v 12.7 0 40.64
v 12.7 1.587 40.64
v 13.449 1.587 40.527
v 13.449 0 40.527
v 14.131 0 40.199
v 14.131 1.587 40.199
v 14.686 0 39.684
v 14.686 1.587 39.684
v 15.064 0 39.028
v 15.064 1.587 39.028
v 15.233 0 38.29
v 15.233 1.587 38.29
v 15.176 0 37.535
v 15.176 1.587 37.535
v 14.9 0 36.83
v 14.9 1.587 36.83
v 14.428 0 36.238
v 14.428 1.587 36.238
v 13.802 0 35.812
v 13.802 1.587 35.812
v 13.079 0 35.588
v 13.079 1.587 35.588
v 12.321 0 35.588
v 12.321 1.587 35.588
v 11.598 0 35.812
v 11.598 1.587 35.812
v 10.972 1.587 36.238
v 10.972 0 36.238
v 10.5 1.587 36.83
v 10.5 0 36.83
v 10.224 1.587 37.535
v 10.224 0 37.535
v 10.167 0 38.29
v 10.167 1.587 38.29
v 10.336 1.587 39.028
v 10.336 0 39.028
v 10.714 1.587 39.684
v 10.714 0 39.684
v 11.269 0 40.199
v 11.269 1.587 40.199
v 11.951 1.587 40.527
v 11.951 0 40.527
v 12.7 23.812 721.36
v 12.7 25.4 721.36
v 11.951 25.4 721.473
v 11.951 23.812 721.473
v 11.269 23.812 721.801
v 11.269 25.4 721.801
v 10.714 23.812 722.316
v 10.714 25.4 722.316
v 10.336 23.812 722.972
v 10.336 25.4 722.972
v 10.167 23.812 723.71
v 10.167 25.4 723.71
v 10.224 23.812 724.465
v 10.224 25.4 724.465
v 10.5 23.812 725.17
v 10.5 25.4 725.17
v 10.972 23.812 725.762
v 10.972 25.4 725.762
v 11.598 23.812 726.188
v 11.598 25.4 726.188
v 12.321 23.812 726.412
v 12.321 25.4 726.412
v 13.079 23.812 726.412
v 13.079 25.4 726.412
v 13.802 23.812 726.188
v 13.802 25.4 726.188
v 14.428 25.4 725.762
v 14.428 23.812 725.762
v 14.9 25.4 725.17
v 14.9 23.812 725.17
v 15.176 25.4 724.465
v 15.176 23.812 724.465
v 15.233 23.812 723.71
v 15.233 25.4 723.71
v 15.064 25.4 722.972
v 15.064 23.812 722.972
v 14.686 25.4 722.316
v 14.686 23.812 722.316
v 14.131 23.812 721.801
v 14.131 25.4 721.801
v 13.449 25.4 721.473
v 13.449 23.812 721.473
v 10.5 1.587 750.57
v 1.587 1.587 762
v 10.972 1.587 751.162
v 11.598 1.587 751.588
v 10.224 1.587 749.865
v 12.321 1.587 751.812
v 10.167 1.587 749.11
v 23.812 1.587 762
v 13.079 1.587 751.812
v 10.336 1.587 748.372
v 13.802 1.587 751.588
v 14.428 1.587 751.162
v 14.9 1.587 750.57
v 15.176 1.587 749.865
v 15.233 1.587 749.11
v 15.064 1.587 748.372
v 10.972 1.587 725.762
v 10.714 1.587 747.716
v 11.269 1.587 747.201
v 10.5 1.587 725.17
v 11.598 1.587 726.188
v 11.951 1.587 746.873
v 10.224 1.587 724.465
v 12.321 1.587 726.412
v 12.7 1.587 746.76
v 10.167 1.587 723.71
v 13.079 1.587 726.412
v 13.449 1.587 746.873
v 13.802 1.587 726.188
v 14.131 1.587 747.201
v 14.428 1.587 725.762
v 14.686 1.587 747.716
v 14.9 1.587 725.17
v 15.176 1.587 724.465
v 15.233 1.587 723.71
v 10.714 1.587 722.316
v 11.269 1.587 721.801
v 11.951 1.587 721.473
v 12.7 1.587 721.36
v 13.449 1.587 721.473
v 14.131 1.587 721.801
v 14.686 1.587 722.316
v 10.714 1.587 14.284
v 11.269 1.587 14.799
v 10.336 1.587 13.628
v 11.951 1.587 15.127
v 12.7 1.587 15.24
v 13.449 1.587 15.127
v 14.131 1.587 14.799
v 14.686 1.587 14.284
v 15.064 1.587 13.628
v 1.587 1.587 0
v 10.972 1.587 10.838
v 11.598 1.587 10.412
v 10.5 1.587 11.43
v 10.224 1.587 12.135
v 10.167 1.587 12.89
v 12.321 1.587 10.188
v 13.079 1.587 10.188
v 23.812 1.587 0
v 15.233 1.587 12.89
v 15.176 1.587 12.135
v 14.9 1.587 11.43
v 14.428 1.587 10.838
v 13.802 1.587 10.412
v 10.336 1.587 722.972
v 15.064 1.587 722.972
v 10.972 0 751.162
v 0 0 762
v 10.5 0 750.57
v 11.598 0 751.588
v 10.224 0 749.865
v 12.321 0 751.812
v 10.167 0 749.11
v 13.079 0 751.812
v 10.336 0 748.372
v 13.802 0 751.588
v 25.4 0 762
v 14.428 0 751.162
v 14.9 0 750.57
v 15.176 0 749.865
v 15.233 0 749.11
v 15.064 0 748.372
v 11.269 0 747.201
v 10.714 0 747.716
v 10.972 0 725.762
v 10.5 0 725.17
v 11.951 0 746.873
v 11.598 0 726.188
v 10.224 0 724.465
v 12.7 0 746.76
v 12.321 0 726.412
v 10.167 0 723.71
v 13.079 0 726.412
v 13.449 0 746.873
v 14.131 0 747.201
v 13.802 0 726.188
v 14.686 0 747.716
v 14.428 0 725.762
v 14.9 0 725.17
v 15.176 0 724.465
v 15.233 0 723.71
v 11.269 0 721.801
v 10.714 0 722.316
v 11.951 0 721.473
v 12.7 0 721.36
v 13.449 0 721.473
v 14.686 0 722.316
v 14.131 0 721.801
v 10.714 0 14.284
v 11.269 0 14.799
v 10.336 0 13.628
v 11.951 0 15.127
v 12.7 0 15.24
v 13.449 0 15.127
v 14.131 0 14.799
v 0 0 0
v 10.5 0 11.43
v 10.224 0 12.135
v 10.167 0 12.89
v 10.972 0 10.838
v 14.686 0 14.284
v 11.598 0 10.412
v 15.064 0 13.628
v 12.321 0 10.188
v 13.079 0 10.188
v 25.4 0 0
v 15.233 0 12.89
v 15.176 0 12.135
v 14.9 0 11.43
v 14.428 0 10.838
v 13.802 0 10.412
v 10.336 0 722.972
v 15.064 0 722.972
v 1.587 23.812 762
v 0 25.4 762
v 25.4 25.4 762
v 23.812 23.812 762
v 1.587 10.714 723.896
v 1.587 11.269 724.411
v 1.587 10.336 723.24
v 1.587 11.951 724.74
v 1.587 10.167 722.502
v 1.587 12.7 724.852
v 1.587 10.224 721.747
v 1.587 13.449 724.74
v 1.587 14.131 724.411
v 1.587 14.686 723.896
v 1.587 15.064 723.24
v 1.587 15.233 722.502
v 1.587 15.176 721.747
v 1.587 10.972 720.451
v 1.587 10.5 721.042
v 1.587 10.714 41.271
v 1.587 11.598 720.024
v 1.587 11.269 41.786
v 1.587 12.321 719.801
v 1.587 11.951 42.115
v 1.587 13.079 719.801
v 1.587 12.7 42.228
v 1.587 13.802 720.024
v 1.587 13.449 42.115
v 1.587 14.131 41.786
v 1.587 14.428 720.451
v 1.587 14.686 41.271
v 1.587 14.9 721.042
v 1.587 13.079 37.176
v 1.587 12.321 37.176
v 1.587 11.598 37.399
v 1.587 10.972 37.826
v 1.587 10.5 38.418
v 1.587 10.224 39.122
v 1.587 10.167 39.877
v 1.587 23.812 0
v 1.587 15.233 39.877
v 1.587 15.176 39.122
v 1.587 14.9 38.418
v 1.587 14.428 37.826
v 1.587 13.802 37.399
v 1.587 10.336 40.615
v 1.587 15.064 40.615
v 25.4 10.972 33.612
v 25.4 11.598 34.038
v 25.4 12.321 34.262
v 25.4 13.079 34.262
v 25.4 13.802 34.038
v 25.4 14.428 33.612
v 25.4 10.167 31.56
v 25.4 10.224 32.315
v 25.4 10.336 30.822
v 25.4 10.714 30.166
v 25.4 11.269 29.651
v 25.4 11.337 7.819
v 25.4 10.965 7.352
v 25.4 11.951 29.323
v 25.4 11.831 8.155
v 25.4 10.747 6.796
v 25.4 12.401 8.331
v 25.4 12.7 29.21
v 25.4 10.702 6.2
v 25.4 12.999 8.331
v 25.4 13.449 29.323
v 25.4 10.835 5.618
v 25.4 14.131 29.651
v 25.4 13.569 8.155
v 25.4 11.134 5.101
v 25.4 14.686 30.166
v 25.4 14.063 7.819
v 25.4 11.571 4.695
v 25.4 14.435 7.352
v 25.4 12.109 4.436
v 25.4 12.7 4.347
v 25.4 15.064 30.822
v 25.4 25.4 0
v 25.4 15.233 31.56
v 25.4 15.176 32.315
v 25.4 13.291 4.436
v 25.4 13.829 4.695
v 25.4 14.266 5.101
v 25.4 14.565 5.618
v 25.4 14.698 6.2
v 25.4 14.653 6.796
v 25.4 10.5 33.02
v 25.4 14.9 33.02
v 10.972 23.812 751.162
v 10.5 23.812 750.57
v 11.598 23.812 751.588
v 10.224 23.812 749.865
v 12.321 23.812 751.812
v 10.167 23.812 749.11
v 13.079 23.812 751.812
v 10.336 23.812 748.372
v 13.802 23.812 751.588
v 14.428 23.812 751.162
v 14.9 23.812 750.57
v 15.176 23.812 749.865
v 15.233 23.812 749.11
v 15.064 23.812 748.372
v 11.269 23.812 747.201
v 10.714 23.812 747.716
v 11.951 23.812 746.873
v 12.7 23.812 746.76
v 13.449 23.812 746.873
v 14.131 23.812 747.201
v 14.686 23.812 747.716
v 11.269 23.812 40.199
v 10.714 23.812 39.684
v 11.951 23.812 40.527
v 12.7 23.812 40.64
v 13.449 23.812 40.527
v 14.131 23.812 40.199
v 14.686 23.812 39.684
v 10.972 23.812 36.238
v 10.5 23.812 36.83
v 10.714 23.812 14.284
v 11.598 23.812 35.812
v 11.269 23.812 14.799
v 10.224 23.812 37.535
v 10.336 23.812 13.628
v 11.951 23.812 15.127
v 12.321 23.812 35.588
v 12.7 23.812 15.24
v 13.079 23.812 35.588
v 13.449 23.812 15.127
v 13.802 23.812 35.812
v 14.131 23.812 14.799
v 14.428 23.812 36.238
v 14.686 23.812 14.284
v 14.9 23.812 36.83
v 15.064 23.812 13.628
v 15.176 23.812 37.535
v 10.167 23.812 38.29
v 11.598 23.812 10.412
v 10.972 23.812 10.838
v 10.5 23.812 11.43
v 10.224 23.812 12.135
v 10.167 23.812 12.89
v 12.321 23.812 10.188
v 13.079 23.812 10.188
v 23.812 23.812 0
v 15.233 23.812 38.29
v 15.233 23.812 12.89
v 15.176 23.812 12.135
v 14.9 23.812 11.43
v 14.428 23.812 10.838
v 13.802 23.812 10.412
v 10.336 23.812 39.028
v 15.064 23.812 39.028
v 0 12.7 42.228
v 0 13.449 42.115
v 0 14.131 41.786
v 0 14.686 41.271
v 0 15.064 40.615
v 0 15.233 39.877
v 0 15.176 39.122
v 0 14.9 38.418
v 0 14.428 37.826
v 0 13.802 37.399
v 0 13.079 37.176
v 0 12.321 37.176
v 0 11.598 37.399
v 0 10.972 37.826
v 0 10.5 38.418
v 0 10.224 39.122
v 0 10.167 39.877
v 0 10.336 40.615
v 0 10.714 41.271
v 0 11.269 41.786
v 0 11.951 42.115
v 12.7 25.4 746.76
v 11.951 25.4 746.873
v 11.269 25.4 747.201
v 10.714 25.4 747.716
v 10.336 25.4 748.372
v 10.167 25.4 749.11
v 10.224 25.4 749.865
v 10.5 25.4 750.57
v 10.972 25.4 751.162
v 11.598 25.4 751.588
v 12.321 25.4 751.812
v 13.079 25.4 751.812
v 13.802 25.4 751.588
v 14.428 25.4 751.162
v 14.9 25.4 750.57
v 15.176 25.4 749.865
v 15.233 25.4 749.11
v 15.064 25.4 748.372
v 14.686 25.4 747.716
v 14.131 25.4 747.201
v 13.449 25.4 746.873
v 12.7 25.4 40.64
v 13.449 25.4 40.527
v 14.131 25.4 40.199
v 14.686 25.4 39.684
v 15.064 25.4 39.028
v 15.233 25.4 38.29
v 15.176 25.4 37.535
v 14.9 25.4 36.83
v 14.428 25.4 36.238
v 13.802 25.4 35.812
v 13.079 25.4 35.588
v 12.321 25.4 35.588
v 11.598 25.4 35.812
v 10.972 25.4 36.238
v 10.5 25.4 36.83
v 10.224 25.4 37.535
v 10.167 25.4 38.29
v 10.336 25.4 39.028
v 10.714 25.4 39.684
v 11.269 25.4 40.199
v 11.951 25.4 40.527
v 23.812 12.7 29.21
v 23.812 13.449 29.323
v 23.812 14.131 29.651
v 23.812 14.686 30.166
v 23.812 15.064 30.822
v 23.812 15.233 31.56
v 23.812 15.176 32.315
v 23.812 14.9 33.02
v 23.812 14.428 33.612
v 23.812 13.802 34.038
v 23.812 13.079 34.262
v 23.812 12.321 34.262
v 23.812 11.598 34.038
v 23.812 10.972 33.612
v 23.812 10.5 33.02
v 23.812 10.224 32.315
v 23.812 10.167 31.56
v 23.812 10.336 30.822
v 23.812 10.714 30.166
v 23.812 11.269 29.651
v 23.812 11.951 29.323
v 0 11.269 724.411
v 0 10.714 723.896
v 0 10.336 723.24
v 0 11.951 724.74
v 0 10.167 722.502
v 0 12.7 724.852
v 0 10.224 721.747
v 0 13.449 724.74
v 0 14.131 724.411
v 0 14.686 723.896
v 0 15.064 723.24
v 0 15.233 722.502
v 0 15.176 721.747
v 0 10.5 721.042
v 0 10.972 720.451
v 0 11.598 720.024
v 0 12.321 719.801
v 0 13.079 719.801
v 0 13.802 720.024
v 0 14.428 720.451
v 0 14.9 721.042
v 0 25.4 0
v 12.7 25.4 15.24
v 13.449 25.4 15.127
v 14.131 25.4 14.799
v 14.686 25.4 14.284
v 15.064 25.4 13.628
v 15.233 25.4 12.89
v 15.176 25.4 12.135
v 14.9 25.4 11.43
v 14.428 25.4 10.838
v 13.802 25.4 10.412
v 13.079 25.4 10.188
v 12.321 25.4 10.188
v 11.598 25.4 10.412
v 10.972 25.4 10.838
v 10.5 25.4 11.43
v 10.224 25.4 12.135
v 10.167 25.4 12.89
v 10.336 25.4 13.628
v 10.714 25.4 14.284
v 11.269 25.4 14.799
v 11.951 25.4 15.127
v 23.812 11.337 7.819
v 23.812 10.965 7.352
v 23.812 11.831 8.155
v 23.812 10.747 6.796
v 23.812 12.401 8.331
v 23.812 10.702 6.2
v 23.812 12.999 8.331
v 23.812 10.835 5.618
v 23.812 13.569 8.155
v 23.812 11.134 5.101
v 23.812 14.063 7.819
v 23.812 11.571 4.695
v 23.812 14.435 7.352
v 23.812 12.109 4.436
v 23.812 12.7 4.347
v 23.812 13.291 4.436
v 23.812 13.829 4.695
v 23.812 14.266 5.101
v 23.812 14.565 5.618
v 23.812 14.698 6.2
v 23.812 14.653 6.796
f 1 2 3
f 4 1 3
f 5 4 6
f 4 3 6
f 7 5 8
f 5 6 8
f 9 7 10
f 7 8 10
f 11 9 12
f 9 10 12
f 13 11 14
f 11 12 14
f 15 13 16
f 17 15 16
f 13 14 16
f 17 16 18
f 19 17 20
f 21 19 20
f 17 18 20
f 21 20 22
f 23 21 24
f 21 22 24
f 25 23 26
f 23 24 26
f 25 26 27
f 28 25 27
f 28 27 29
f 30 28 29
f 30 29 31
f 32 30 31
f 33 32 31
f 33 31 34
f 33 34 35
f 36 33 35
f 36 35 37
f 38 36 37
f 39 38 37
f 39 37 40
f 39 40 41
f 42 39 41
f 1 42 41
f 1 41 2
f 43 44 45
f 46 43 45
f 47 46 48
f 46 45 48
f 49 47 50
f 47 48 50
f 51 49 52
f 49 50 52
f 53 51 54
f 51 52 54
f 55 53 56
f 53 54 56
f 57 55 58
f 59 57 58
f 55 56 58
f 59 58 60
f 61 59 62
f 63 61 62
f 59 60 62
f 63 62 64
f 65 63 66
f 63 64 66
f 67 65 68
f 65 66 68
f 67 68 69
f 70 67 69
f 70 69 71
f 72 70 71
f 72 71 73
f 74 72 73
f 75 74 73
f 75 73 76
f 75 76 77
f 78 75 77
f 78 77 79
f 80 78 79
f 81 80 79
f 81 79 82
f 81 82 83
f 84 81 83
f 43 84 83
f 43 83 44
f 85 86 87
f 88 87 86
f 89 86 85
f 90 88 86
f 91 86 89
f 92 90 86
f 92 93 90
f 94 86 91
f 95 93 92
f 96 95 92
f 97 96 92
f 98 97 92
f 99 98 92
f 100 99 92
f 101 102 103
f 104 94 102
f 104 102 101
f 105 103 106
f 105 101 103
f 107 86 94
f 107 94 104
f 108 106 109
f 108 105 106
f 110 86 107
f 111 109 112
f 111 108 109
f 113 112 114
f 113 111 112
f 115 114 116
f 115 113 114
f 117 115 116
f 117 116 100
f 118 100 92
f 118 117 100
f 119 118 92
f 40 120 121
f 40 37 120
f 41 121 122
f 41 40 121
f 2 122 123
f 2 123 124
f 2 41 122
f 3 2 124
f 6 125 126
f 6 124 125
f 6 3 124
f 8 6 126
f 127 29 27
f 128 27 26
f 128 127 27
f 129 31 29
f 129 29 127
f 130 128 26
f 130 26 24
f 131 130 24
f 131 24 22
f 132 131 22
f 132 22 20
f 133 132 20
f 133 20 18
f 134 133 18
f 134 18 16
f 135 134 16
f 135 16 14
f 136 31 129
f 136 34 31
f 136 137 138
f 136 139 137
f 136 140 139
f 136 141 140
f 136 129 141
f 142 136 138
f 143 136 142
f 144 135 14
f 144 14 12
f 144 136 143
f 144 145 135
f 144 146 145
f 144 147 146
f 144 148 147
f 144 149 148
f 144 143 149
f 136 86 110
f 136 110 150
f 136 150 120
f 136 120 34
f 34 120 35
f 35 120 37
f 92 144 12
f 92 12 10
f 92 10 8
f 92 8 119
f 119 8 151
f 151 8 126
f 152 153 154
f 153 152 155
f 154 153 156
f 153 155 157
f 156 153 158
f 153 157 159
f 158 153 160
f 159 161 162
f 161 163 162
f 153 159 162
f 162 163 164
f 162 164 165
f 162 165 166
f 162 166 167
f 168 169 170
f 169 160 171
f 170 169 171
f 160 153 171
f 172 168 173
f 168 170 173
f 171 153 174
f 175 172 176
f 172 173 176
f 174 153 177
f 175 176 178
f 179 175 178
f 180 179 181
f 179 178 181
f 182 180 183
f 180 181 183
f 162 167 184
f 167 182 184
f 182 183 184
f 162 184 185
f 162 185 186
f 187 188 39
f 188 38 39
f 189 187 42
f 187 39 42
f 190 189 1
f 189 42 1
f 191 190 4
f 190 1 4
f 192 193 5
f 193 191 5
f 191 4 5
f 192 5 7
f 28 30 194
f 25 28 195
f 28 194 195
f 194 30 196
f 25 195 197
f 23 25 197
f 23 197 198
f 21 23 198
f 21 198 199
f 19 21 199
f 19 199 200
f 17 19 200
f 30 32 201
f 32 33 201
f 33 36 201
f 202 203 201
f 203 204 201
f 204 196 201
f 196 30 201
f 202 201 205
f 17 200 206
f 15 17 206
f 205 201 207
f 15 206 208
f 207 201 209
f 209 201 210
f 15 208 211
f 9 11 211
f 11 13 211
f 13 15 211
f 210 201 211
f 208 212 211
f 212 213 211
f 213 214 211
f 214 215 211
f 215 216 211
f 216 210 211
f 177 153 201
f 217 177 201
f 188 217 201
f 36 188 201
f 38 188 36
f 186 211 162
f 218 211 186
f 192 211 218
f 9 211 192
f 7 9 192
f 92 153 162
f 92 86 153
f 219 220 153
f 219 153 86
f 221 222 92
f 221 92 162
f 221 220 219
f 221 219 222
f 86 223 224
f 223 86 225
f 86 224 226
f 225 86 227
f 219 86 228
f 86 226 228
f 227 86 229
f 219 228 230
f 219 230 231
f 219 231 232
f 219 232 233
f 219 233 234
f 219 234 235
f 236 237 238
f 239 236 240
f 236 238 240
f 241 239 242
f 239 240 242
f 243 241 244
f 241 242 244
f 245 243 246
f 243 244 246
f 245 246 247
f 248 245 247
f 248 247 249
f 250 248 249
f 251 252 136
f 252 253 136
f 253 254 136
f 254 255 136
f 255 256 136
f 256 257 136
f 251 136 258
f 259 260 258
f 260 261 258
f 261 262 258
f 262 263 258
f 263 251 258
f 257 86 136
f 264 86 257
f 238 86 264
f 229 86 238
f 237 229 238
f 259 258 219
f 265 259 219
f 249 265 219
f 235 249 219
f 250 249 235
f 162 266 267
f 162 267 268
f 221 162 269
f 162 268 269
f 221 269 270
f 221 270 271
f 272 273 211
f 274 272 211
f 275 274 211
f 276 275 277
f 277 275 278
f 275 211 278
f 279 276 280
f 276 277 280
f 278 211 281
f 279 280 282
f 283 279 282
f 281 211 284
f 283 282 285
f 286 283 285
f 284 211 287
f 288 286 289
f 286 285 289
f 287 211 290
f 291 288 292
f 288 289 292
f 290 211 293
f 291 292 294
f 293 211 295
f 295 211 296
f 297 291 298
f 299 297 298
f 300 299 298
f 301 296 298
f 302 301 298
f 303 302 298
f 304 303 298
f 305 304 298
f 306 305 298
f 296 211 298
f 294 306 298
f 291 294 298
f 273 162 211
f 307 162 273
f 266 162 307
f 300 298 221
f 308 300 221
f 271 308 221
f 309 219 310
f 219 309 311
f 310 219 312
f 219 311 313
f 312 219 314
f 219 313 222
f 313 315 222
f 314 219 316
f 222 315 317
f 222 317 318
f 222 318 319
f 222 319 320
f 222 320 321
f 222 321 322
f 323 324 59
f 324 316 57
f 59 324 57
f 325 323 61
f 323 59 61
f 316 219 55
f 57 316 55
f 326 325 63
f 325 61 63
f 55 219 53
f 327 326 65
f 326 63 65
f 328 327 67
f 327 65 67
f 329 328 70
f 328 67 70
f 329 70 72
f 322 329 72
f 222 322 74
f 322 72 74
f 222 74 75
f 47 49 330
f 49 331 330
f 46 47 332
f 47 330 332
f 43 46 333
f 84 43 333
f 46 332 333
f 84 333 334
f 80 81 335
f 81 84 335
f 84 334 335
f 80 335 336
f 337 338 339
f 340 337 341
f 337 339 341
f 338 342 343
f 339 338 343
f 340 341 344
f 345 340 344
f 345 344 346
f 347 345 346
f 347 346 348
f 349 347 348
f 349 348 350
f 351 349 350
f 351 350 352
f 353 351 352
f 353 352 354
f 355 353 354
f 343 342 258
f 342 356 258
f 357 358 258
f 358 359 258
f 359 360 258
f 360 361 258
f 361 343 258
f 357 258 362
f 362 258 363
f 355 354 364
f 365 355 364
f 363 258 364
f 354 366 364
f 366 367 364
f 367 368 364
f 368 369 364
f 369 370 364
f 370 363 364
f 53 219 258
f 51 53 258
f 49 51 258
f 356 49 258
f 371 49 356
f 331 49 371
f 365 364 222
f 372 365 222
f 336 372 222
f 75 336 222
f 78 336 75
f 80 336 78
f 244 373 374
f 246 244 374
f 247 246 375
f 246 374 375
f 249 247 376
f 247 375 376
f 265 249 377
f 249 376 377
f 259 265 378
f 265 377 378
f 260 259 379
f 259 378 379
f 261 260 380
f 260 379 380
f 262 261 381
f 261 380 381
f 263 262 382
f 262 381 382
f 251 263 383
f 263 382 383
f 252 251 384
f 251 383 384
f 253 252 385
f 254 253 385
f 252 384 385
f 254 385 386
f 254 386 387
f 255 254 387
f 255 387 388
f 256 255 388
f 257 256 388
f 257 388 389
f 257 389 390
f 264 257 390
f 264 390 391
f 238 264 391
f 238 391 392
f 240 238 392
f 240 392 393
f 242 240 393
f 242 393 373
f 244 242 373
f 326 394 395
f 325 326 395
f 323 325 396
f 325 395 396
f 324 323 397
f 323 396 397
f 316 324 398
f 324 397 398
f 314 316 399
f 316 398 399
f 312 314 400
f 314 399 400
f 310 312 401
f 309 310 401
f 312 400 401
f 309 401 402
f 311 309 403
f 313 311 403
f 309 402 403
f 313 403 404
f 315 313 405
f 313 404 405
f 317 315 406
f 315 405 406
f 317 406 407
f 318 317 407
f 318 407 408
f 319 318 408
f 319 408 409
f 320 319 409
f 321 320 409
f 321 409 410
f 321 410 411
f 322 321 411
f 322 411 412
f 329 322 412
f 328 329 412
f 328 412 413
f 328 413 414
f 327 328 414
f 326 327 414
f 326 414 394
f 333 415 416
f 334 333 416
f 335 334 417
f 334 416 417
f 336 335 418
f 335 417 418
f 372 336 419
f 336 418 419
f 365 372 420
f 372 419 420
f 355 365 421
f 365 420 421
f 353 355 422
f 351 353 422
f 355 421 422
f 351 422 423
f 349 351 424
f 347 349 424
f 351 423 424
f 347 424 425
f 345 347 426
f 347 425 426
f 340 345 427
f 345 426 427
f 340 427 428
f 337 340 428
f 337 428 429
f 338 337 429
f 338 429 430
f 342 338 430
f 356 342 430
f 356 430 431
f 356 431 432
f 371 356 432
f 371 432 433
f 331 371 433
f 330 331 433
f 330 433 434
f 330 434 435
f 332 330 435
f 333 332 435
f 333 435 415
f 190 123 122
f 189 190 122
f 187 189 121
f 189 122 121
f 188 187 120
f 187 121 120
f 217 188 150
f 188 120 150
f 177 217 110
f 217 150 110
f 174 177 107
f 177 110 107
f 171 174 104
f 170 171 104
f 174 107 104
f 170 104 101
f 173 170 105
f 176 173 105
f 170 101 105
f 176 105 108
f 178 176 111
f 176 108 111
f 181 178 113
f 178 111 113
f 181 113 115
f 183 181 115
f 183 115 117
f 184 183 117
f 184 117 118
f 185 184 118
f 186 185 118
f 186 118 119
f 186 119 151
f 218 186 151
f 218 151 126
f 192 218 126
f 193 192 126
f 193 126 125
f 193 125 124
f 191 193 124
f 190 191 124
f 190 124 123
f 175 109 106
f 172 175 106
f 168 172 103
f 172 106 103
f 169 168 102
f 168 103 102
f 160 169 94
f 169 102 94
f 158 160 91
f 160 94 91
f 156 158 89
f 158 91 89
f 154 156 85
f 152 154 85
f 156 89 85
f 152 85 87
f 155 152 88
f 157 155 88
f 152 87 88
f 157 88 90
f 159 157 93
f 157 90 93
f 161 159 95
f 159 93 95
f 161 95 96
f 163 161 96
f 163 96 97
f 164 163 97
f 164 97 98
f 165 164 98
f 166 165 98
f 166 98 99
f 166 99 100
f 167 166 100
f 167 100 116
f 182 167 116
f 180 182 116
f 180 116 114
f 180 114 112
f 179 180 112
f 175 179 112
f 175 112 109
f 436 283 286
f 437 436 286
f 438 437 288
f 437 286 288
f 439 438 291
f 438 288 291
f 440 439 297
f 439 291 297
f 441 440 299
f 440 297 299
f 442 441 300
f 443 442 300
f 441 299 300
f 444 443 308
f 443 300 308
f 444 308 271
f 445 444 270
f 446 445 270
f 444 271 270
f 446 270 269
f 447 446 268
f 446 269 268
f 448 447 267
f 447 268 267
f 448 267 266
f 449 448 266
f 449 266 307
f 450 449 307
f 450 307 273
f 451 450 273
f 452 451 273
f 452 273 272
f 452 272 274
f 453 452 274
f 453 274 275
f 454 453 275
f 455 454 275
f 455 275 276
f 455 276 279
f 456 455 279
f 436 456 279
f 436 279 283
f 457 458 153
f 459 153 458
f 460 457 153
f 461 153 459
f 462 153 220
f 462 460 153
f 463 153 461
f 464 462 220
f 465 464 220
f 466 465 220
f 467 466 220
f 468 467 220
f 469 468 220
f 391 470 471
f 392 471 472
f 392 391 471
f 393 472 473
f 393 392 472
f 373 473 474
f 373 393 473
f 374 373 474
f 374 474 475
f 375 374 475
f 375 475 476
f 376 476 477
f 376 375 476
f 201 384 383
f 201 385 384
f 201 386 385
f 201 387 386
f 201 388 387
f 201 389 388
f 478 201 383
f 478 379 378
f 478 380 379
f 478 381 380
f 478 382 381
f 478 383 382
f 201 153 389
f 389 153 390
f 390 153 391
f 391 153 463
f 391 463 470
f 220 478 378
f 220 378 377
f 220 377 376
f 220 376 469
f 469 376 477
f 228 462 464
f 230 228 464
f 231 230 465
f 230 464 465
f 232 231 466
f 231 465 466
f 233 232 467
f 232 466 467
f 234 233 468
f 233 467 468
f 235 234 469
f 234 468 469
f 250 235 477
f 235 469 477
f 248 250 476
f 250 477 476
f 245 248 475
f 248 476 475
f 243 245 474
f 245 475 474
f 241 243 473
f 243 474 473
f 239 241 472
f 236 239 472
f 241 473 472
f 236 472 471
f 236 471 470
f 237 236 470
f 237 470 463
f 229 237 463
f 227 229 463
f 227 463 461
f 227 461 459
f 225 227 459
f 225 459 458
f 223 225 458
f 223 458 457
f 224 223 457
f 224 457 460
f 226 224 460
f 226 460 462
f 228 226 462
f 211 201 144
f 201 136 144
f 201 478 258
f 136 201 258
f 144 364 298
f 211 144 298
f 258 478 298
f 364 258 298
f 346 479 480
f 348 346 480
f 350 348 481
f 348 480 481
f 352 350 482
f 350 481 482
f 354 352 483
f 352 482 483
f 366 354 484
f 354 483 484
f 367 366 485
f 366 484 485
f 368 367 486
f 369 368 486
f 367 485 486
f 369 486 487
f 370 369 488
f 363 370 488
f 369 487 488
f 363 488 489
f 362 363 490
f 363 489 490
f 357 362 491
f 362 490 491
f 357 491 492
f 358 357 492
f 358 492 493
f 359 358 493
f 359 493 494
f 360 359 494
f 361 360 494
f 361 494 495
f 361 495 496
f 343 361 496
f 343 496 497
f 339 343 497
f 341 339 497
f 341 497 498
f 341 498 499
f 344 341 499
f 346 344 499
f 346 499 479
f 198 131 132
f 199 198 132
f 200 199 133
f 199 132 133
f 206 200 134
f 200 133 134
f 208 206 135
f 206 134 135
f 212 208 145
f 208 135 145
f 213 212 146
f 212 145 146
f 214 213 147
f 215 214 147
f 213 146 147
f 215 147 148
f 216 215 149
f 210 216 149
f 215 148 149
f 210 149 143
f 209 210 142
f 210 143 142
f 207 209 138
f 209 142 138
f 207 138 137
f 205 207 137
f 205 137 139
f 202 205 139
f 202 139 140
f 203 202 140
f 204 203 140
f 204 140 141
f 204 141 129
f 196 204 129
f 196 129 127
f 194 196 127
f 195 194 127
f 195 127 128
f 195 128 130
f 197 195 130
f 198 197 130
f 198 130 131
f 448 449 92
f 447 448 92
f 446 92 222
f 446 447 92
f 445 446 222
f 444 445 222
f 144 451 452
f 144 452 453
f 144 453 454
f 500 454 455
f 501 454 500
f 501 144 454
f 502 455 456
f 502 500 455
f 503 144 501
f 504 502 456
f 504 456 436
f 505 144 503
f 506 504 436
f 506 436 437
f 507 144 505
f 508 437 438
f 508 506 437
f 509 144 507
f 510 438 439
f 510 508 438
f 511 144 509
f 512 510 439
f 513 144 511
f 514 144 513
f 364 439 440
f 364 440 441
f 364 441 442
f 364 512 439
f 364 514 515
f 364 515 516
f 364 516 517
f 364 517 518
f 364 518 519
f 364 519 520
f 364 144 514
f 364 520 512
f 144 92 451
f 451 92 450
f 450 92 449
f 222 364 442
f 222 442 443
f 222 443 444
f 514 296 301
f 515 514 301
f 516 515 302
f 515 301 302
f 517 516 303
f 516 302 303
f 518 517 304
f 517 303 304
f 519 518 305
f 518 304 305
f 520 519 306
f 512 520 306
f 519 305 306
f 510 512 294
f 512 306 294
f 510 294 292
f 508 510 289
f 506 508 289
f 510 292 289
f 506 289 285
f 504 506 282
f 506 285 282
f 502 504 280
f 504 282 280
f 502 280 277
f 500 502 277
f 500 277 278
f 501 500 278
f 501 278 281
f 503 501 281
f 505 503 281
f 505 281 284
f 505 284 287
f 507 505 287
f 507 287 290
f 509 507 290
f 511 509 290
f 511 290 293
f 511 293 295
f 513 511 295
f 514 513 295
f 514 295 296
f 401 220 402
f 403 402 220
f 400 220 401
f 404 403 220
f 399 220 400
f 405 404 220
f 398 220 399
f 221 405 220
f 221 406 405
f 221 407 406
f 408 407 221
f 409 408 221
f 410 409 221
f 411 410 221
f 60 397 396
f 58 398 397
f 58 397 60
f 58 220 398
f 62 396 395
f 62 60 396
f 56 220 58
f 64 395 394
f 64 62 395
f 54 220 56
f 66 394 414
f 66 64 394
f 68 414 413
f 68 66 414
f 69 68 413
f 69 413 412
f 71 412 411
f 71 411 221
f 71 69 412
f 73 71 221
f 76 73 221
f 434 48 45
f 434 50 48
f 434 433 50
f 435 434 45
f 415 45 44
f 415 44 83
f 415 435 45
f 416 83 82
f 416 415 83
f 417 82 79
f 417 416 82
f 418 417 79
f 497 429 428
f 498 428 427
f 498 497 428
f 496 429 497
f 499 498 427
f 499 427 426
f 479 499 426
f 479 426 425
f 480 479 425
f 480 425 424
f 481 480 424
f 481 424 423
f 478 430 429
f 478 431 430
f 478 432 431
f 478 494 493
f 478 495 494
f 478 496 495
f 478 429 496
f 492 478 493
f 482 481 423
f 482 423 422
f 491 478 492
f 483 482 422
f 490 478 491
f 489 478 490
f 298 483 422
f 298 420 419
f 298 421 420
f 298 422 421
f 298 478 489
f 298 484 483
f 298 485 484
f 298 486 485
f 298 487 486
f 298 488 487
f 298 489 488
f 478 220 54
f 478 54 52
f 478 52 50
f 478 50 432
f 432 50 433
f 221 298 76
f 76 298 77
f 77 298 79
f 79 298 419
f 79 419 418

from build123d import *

# Parameters (mm, degrees)
SKETCH1_W           = 25.4
SKETCH1_H           = 25.4
SKETCH1_W_2         = 22.225
SKETCH1_H_2         = 22.225
BOSS_EXTRUDE1_DEPTH = 762
SKETCH3_R           = 2.54
CUT_EXTRUDE2_DEPTH  = 763.846196818
CUT_EXTRUDE3_REACH  = 764.846
SKETCH4_R           = 2.003399785
SKETCH4_R_2         = 2.54
CUT_EXTRUDE4_REACH  = 764.846
SKETCH5_R           = 2.54


with BuildPart() as part:
    # Sketch1 → Boss-Extrude1 (new body)
    with BuildSketch(Plane.XY):
        with Locations((12.7, 12.7)):
            Rectangle(SKETCH1_W, SKETCH1_H)
        with Locations((12.7, 12.7)):
            Rectangle(SKETCH1_W_2, SKETCH1_H_2, mode=Mode.SUBTRACT)
    extrude(amount=BOSS_EXTRUDE1_DEPTH)

    # Sketch3 → Cut-Extrude2 (cut, through all)
    with BuildSketch(Plane(origin=(0, 25.4, 0), x_dir=(1, 0, 0), z_dir=(0, 1, 0))):
        with Locations(Location((12.7, -12.7, 0), (0, 0, 270))):
            Circle(SKETCH3_R)
        with Locations(Location((12.7, -38.1, 0), (0, 0, 270))):
            Circle(SKETCH3_R)
        with Locations(Location((12.7, -723.9, 0), (0, 0, 90))):
            Circle(SKETCH3_R)
        with Locations(Location((12.7, -749.3, 0), (0, 0, 90))):
            Circle(SKETCH3_R)
    extrude(amount=-CUT_EXTRUDE2_DEPTH, mode=Mode.SUBTRACT)

    # Sketch4 → Cut-Extrude3 (cut, up to next)
    with BuildSketch(Plane(origin=(25.4, 0, 0), x_dir=(0, 0, -1), z_dir=(1, 0, 0)), mode=Mode.PRIVATE) as cut_extrude3_sk1:
        with Locations((-6.35, 12.7)):
            Circle(SKETCH4_R)
    cut_extrude3_tool1 = extrude(cut_extrude3_sk1.sketch, amount=-CUT_EXTRUDE3_REACH, mode=Mode.PRIVATE) & part.part
    # Sketch4 → Cut-Extrude3 (cut, up to next)
    with BuildSketch(Plane(origin=(25.4, 0, 0), x_dir=(0, 0, -1), z_dir=(1, 0, 0)), mode=Mode.PRIVATE) as cut_extrude3_sk2:
        with Locations((-31.75, 12.7)):
            Circle(SKETCH4_R_2)
    cut_extrude3_tool2 = extrude(cut_extrude3_sk2.sketch, amount=-CUT_EXTRUDE3_REACH, mode=Mode.PRIVATE) & part.part
    add(cut_extrude3_tool1.solids().sort_by_distance((25.4, 12.7, 6.35))[0], mode=Mode.SUBTRACT)
    add(cut_extrude3_tool2.solids().sort_by_distance((25.4, 12.7, 31.75))[0], mode=Mode.SUBTRACT)

    # Sketch5 → Cut-Extrude4 (cut, up to next)
    with BuildSketch(Plane.ZY, mode=Mode.PRIVATE) as cut_extrude4_sk1:
        with Locations((39.6875, 12.7)):
            Circle(SKETCH5_R)
    cut_extrude4_tool1 = extrude(cut_extrude4_sk1.sketch, amount=-CUT_EXTRUDE4_REACH, mode=Mode.PRIVATE) & part.part
    # Sketch5 → Cut-Extrude4 (cut, up to next)
    with BuildSketch(Plane.ZY, mode=Mode.PRIVATE) as cut_extrude4_sk2:
        with Locations((722.3125, 12.7)):
            Circle(SKETCH5_R)
    cut_extrude4_tool2 = extrude(cut_extrude4_sk2.sketch, amount=-CUT_EXTRUDE4_REACH, mode=Mode.PRIVATE) & part.part
    add(cut_extrude4_tool1.solids().sort_by_distance((0, 12.7, 39.6875))[0], mode=Mode.SUBTRACT)
    add(cut_extrude4_tool2.solids().sort_by_distance((0, 12.7, 722.3125))[0], mode=Mode.SUBTRACT)


solid = part.part
